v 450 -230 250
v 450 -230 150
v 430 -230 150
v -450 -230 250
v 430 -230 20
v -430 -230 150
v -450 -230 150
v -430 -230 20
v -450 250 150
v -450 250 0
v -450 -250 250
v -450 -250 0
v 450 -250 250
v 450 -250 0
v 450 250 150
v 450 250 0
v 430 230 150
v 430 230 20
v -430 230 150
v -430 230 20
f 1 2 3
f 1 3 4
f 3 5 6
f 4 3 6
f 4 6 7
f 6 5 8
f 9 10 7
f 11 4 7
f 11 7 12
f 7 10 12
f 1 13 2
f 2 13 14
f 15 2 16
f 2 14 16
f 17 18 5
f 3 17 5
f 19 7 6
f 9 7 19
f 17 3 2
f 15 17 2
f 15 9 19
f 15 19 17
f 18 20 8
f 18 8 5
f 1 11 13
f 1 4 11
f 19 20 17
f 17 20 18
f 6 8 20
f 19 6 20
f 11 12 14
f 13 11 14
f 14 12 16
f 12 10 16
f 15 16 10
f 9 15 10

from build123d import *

# Parameters (mm, degrees)
F1_DEPTH = 150
F0_W     = 860
F0_H     = 460
F2_DEPTH = 20
F3_DEPTH = 250


with BuildPart() as f1:
    # F0 (on Top) → F1 (new body)
    with BuildSketch(Plane.XY):
        Polygon((430, -230), (450, -230), (450, 230), (450, 250), (-450, 250), (-450, -230), (-430, -230), (-430, 230), (430, 230), align=None)
    extrude(amount=F1_DEPTH)

    # F0 (on Top) → F2 (join)
    with BuildSketch(Plane.XY):
        Polygon((-450, -250), (450, -250), (450, -230), (430, -230), (-430, -230), (-450, -230), align=None)
        Polygon((430, -230), (450, -230), (450, 230), (450, 250), (-450, 250), (-450, -230), (-430, -230), (-430, 230), (430, 230), align=None)
        Rectangle(F0_W, F0_H)
    extrude(amount=F2_DEPTH)

    # F0 (on Top) → F3 (join)
    with BuildSketch(Plane.XY):
        Polygon((-450, -250), (450, -250), (450, -230), (430, -230), (-430, -230), (-450, -230), align=None)
    extrude(amount=F3_DEPTH)


solid = f1.part
